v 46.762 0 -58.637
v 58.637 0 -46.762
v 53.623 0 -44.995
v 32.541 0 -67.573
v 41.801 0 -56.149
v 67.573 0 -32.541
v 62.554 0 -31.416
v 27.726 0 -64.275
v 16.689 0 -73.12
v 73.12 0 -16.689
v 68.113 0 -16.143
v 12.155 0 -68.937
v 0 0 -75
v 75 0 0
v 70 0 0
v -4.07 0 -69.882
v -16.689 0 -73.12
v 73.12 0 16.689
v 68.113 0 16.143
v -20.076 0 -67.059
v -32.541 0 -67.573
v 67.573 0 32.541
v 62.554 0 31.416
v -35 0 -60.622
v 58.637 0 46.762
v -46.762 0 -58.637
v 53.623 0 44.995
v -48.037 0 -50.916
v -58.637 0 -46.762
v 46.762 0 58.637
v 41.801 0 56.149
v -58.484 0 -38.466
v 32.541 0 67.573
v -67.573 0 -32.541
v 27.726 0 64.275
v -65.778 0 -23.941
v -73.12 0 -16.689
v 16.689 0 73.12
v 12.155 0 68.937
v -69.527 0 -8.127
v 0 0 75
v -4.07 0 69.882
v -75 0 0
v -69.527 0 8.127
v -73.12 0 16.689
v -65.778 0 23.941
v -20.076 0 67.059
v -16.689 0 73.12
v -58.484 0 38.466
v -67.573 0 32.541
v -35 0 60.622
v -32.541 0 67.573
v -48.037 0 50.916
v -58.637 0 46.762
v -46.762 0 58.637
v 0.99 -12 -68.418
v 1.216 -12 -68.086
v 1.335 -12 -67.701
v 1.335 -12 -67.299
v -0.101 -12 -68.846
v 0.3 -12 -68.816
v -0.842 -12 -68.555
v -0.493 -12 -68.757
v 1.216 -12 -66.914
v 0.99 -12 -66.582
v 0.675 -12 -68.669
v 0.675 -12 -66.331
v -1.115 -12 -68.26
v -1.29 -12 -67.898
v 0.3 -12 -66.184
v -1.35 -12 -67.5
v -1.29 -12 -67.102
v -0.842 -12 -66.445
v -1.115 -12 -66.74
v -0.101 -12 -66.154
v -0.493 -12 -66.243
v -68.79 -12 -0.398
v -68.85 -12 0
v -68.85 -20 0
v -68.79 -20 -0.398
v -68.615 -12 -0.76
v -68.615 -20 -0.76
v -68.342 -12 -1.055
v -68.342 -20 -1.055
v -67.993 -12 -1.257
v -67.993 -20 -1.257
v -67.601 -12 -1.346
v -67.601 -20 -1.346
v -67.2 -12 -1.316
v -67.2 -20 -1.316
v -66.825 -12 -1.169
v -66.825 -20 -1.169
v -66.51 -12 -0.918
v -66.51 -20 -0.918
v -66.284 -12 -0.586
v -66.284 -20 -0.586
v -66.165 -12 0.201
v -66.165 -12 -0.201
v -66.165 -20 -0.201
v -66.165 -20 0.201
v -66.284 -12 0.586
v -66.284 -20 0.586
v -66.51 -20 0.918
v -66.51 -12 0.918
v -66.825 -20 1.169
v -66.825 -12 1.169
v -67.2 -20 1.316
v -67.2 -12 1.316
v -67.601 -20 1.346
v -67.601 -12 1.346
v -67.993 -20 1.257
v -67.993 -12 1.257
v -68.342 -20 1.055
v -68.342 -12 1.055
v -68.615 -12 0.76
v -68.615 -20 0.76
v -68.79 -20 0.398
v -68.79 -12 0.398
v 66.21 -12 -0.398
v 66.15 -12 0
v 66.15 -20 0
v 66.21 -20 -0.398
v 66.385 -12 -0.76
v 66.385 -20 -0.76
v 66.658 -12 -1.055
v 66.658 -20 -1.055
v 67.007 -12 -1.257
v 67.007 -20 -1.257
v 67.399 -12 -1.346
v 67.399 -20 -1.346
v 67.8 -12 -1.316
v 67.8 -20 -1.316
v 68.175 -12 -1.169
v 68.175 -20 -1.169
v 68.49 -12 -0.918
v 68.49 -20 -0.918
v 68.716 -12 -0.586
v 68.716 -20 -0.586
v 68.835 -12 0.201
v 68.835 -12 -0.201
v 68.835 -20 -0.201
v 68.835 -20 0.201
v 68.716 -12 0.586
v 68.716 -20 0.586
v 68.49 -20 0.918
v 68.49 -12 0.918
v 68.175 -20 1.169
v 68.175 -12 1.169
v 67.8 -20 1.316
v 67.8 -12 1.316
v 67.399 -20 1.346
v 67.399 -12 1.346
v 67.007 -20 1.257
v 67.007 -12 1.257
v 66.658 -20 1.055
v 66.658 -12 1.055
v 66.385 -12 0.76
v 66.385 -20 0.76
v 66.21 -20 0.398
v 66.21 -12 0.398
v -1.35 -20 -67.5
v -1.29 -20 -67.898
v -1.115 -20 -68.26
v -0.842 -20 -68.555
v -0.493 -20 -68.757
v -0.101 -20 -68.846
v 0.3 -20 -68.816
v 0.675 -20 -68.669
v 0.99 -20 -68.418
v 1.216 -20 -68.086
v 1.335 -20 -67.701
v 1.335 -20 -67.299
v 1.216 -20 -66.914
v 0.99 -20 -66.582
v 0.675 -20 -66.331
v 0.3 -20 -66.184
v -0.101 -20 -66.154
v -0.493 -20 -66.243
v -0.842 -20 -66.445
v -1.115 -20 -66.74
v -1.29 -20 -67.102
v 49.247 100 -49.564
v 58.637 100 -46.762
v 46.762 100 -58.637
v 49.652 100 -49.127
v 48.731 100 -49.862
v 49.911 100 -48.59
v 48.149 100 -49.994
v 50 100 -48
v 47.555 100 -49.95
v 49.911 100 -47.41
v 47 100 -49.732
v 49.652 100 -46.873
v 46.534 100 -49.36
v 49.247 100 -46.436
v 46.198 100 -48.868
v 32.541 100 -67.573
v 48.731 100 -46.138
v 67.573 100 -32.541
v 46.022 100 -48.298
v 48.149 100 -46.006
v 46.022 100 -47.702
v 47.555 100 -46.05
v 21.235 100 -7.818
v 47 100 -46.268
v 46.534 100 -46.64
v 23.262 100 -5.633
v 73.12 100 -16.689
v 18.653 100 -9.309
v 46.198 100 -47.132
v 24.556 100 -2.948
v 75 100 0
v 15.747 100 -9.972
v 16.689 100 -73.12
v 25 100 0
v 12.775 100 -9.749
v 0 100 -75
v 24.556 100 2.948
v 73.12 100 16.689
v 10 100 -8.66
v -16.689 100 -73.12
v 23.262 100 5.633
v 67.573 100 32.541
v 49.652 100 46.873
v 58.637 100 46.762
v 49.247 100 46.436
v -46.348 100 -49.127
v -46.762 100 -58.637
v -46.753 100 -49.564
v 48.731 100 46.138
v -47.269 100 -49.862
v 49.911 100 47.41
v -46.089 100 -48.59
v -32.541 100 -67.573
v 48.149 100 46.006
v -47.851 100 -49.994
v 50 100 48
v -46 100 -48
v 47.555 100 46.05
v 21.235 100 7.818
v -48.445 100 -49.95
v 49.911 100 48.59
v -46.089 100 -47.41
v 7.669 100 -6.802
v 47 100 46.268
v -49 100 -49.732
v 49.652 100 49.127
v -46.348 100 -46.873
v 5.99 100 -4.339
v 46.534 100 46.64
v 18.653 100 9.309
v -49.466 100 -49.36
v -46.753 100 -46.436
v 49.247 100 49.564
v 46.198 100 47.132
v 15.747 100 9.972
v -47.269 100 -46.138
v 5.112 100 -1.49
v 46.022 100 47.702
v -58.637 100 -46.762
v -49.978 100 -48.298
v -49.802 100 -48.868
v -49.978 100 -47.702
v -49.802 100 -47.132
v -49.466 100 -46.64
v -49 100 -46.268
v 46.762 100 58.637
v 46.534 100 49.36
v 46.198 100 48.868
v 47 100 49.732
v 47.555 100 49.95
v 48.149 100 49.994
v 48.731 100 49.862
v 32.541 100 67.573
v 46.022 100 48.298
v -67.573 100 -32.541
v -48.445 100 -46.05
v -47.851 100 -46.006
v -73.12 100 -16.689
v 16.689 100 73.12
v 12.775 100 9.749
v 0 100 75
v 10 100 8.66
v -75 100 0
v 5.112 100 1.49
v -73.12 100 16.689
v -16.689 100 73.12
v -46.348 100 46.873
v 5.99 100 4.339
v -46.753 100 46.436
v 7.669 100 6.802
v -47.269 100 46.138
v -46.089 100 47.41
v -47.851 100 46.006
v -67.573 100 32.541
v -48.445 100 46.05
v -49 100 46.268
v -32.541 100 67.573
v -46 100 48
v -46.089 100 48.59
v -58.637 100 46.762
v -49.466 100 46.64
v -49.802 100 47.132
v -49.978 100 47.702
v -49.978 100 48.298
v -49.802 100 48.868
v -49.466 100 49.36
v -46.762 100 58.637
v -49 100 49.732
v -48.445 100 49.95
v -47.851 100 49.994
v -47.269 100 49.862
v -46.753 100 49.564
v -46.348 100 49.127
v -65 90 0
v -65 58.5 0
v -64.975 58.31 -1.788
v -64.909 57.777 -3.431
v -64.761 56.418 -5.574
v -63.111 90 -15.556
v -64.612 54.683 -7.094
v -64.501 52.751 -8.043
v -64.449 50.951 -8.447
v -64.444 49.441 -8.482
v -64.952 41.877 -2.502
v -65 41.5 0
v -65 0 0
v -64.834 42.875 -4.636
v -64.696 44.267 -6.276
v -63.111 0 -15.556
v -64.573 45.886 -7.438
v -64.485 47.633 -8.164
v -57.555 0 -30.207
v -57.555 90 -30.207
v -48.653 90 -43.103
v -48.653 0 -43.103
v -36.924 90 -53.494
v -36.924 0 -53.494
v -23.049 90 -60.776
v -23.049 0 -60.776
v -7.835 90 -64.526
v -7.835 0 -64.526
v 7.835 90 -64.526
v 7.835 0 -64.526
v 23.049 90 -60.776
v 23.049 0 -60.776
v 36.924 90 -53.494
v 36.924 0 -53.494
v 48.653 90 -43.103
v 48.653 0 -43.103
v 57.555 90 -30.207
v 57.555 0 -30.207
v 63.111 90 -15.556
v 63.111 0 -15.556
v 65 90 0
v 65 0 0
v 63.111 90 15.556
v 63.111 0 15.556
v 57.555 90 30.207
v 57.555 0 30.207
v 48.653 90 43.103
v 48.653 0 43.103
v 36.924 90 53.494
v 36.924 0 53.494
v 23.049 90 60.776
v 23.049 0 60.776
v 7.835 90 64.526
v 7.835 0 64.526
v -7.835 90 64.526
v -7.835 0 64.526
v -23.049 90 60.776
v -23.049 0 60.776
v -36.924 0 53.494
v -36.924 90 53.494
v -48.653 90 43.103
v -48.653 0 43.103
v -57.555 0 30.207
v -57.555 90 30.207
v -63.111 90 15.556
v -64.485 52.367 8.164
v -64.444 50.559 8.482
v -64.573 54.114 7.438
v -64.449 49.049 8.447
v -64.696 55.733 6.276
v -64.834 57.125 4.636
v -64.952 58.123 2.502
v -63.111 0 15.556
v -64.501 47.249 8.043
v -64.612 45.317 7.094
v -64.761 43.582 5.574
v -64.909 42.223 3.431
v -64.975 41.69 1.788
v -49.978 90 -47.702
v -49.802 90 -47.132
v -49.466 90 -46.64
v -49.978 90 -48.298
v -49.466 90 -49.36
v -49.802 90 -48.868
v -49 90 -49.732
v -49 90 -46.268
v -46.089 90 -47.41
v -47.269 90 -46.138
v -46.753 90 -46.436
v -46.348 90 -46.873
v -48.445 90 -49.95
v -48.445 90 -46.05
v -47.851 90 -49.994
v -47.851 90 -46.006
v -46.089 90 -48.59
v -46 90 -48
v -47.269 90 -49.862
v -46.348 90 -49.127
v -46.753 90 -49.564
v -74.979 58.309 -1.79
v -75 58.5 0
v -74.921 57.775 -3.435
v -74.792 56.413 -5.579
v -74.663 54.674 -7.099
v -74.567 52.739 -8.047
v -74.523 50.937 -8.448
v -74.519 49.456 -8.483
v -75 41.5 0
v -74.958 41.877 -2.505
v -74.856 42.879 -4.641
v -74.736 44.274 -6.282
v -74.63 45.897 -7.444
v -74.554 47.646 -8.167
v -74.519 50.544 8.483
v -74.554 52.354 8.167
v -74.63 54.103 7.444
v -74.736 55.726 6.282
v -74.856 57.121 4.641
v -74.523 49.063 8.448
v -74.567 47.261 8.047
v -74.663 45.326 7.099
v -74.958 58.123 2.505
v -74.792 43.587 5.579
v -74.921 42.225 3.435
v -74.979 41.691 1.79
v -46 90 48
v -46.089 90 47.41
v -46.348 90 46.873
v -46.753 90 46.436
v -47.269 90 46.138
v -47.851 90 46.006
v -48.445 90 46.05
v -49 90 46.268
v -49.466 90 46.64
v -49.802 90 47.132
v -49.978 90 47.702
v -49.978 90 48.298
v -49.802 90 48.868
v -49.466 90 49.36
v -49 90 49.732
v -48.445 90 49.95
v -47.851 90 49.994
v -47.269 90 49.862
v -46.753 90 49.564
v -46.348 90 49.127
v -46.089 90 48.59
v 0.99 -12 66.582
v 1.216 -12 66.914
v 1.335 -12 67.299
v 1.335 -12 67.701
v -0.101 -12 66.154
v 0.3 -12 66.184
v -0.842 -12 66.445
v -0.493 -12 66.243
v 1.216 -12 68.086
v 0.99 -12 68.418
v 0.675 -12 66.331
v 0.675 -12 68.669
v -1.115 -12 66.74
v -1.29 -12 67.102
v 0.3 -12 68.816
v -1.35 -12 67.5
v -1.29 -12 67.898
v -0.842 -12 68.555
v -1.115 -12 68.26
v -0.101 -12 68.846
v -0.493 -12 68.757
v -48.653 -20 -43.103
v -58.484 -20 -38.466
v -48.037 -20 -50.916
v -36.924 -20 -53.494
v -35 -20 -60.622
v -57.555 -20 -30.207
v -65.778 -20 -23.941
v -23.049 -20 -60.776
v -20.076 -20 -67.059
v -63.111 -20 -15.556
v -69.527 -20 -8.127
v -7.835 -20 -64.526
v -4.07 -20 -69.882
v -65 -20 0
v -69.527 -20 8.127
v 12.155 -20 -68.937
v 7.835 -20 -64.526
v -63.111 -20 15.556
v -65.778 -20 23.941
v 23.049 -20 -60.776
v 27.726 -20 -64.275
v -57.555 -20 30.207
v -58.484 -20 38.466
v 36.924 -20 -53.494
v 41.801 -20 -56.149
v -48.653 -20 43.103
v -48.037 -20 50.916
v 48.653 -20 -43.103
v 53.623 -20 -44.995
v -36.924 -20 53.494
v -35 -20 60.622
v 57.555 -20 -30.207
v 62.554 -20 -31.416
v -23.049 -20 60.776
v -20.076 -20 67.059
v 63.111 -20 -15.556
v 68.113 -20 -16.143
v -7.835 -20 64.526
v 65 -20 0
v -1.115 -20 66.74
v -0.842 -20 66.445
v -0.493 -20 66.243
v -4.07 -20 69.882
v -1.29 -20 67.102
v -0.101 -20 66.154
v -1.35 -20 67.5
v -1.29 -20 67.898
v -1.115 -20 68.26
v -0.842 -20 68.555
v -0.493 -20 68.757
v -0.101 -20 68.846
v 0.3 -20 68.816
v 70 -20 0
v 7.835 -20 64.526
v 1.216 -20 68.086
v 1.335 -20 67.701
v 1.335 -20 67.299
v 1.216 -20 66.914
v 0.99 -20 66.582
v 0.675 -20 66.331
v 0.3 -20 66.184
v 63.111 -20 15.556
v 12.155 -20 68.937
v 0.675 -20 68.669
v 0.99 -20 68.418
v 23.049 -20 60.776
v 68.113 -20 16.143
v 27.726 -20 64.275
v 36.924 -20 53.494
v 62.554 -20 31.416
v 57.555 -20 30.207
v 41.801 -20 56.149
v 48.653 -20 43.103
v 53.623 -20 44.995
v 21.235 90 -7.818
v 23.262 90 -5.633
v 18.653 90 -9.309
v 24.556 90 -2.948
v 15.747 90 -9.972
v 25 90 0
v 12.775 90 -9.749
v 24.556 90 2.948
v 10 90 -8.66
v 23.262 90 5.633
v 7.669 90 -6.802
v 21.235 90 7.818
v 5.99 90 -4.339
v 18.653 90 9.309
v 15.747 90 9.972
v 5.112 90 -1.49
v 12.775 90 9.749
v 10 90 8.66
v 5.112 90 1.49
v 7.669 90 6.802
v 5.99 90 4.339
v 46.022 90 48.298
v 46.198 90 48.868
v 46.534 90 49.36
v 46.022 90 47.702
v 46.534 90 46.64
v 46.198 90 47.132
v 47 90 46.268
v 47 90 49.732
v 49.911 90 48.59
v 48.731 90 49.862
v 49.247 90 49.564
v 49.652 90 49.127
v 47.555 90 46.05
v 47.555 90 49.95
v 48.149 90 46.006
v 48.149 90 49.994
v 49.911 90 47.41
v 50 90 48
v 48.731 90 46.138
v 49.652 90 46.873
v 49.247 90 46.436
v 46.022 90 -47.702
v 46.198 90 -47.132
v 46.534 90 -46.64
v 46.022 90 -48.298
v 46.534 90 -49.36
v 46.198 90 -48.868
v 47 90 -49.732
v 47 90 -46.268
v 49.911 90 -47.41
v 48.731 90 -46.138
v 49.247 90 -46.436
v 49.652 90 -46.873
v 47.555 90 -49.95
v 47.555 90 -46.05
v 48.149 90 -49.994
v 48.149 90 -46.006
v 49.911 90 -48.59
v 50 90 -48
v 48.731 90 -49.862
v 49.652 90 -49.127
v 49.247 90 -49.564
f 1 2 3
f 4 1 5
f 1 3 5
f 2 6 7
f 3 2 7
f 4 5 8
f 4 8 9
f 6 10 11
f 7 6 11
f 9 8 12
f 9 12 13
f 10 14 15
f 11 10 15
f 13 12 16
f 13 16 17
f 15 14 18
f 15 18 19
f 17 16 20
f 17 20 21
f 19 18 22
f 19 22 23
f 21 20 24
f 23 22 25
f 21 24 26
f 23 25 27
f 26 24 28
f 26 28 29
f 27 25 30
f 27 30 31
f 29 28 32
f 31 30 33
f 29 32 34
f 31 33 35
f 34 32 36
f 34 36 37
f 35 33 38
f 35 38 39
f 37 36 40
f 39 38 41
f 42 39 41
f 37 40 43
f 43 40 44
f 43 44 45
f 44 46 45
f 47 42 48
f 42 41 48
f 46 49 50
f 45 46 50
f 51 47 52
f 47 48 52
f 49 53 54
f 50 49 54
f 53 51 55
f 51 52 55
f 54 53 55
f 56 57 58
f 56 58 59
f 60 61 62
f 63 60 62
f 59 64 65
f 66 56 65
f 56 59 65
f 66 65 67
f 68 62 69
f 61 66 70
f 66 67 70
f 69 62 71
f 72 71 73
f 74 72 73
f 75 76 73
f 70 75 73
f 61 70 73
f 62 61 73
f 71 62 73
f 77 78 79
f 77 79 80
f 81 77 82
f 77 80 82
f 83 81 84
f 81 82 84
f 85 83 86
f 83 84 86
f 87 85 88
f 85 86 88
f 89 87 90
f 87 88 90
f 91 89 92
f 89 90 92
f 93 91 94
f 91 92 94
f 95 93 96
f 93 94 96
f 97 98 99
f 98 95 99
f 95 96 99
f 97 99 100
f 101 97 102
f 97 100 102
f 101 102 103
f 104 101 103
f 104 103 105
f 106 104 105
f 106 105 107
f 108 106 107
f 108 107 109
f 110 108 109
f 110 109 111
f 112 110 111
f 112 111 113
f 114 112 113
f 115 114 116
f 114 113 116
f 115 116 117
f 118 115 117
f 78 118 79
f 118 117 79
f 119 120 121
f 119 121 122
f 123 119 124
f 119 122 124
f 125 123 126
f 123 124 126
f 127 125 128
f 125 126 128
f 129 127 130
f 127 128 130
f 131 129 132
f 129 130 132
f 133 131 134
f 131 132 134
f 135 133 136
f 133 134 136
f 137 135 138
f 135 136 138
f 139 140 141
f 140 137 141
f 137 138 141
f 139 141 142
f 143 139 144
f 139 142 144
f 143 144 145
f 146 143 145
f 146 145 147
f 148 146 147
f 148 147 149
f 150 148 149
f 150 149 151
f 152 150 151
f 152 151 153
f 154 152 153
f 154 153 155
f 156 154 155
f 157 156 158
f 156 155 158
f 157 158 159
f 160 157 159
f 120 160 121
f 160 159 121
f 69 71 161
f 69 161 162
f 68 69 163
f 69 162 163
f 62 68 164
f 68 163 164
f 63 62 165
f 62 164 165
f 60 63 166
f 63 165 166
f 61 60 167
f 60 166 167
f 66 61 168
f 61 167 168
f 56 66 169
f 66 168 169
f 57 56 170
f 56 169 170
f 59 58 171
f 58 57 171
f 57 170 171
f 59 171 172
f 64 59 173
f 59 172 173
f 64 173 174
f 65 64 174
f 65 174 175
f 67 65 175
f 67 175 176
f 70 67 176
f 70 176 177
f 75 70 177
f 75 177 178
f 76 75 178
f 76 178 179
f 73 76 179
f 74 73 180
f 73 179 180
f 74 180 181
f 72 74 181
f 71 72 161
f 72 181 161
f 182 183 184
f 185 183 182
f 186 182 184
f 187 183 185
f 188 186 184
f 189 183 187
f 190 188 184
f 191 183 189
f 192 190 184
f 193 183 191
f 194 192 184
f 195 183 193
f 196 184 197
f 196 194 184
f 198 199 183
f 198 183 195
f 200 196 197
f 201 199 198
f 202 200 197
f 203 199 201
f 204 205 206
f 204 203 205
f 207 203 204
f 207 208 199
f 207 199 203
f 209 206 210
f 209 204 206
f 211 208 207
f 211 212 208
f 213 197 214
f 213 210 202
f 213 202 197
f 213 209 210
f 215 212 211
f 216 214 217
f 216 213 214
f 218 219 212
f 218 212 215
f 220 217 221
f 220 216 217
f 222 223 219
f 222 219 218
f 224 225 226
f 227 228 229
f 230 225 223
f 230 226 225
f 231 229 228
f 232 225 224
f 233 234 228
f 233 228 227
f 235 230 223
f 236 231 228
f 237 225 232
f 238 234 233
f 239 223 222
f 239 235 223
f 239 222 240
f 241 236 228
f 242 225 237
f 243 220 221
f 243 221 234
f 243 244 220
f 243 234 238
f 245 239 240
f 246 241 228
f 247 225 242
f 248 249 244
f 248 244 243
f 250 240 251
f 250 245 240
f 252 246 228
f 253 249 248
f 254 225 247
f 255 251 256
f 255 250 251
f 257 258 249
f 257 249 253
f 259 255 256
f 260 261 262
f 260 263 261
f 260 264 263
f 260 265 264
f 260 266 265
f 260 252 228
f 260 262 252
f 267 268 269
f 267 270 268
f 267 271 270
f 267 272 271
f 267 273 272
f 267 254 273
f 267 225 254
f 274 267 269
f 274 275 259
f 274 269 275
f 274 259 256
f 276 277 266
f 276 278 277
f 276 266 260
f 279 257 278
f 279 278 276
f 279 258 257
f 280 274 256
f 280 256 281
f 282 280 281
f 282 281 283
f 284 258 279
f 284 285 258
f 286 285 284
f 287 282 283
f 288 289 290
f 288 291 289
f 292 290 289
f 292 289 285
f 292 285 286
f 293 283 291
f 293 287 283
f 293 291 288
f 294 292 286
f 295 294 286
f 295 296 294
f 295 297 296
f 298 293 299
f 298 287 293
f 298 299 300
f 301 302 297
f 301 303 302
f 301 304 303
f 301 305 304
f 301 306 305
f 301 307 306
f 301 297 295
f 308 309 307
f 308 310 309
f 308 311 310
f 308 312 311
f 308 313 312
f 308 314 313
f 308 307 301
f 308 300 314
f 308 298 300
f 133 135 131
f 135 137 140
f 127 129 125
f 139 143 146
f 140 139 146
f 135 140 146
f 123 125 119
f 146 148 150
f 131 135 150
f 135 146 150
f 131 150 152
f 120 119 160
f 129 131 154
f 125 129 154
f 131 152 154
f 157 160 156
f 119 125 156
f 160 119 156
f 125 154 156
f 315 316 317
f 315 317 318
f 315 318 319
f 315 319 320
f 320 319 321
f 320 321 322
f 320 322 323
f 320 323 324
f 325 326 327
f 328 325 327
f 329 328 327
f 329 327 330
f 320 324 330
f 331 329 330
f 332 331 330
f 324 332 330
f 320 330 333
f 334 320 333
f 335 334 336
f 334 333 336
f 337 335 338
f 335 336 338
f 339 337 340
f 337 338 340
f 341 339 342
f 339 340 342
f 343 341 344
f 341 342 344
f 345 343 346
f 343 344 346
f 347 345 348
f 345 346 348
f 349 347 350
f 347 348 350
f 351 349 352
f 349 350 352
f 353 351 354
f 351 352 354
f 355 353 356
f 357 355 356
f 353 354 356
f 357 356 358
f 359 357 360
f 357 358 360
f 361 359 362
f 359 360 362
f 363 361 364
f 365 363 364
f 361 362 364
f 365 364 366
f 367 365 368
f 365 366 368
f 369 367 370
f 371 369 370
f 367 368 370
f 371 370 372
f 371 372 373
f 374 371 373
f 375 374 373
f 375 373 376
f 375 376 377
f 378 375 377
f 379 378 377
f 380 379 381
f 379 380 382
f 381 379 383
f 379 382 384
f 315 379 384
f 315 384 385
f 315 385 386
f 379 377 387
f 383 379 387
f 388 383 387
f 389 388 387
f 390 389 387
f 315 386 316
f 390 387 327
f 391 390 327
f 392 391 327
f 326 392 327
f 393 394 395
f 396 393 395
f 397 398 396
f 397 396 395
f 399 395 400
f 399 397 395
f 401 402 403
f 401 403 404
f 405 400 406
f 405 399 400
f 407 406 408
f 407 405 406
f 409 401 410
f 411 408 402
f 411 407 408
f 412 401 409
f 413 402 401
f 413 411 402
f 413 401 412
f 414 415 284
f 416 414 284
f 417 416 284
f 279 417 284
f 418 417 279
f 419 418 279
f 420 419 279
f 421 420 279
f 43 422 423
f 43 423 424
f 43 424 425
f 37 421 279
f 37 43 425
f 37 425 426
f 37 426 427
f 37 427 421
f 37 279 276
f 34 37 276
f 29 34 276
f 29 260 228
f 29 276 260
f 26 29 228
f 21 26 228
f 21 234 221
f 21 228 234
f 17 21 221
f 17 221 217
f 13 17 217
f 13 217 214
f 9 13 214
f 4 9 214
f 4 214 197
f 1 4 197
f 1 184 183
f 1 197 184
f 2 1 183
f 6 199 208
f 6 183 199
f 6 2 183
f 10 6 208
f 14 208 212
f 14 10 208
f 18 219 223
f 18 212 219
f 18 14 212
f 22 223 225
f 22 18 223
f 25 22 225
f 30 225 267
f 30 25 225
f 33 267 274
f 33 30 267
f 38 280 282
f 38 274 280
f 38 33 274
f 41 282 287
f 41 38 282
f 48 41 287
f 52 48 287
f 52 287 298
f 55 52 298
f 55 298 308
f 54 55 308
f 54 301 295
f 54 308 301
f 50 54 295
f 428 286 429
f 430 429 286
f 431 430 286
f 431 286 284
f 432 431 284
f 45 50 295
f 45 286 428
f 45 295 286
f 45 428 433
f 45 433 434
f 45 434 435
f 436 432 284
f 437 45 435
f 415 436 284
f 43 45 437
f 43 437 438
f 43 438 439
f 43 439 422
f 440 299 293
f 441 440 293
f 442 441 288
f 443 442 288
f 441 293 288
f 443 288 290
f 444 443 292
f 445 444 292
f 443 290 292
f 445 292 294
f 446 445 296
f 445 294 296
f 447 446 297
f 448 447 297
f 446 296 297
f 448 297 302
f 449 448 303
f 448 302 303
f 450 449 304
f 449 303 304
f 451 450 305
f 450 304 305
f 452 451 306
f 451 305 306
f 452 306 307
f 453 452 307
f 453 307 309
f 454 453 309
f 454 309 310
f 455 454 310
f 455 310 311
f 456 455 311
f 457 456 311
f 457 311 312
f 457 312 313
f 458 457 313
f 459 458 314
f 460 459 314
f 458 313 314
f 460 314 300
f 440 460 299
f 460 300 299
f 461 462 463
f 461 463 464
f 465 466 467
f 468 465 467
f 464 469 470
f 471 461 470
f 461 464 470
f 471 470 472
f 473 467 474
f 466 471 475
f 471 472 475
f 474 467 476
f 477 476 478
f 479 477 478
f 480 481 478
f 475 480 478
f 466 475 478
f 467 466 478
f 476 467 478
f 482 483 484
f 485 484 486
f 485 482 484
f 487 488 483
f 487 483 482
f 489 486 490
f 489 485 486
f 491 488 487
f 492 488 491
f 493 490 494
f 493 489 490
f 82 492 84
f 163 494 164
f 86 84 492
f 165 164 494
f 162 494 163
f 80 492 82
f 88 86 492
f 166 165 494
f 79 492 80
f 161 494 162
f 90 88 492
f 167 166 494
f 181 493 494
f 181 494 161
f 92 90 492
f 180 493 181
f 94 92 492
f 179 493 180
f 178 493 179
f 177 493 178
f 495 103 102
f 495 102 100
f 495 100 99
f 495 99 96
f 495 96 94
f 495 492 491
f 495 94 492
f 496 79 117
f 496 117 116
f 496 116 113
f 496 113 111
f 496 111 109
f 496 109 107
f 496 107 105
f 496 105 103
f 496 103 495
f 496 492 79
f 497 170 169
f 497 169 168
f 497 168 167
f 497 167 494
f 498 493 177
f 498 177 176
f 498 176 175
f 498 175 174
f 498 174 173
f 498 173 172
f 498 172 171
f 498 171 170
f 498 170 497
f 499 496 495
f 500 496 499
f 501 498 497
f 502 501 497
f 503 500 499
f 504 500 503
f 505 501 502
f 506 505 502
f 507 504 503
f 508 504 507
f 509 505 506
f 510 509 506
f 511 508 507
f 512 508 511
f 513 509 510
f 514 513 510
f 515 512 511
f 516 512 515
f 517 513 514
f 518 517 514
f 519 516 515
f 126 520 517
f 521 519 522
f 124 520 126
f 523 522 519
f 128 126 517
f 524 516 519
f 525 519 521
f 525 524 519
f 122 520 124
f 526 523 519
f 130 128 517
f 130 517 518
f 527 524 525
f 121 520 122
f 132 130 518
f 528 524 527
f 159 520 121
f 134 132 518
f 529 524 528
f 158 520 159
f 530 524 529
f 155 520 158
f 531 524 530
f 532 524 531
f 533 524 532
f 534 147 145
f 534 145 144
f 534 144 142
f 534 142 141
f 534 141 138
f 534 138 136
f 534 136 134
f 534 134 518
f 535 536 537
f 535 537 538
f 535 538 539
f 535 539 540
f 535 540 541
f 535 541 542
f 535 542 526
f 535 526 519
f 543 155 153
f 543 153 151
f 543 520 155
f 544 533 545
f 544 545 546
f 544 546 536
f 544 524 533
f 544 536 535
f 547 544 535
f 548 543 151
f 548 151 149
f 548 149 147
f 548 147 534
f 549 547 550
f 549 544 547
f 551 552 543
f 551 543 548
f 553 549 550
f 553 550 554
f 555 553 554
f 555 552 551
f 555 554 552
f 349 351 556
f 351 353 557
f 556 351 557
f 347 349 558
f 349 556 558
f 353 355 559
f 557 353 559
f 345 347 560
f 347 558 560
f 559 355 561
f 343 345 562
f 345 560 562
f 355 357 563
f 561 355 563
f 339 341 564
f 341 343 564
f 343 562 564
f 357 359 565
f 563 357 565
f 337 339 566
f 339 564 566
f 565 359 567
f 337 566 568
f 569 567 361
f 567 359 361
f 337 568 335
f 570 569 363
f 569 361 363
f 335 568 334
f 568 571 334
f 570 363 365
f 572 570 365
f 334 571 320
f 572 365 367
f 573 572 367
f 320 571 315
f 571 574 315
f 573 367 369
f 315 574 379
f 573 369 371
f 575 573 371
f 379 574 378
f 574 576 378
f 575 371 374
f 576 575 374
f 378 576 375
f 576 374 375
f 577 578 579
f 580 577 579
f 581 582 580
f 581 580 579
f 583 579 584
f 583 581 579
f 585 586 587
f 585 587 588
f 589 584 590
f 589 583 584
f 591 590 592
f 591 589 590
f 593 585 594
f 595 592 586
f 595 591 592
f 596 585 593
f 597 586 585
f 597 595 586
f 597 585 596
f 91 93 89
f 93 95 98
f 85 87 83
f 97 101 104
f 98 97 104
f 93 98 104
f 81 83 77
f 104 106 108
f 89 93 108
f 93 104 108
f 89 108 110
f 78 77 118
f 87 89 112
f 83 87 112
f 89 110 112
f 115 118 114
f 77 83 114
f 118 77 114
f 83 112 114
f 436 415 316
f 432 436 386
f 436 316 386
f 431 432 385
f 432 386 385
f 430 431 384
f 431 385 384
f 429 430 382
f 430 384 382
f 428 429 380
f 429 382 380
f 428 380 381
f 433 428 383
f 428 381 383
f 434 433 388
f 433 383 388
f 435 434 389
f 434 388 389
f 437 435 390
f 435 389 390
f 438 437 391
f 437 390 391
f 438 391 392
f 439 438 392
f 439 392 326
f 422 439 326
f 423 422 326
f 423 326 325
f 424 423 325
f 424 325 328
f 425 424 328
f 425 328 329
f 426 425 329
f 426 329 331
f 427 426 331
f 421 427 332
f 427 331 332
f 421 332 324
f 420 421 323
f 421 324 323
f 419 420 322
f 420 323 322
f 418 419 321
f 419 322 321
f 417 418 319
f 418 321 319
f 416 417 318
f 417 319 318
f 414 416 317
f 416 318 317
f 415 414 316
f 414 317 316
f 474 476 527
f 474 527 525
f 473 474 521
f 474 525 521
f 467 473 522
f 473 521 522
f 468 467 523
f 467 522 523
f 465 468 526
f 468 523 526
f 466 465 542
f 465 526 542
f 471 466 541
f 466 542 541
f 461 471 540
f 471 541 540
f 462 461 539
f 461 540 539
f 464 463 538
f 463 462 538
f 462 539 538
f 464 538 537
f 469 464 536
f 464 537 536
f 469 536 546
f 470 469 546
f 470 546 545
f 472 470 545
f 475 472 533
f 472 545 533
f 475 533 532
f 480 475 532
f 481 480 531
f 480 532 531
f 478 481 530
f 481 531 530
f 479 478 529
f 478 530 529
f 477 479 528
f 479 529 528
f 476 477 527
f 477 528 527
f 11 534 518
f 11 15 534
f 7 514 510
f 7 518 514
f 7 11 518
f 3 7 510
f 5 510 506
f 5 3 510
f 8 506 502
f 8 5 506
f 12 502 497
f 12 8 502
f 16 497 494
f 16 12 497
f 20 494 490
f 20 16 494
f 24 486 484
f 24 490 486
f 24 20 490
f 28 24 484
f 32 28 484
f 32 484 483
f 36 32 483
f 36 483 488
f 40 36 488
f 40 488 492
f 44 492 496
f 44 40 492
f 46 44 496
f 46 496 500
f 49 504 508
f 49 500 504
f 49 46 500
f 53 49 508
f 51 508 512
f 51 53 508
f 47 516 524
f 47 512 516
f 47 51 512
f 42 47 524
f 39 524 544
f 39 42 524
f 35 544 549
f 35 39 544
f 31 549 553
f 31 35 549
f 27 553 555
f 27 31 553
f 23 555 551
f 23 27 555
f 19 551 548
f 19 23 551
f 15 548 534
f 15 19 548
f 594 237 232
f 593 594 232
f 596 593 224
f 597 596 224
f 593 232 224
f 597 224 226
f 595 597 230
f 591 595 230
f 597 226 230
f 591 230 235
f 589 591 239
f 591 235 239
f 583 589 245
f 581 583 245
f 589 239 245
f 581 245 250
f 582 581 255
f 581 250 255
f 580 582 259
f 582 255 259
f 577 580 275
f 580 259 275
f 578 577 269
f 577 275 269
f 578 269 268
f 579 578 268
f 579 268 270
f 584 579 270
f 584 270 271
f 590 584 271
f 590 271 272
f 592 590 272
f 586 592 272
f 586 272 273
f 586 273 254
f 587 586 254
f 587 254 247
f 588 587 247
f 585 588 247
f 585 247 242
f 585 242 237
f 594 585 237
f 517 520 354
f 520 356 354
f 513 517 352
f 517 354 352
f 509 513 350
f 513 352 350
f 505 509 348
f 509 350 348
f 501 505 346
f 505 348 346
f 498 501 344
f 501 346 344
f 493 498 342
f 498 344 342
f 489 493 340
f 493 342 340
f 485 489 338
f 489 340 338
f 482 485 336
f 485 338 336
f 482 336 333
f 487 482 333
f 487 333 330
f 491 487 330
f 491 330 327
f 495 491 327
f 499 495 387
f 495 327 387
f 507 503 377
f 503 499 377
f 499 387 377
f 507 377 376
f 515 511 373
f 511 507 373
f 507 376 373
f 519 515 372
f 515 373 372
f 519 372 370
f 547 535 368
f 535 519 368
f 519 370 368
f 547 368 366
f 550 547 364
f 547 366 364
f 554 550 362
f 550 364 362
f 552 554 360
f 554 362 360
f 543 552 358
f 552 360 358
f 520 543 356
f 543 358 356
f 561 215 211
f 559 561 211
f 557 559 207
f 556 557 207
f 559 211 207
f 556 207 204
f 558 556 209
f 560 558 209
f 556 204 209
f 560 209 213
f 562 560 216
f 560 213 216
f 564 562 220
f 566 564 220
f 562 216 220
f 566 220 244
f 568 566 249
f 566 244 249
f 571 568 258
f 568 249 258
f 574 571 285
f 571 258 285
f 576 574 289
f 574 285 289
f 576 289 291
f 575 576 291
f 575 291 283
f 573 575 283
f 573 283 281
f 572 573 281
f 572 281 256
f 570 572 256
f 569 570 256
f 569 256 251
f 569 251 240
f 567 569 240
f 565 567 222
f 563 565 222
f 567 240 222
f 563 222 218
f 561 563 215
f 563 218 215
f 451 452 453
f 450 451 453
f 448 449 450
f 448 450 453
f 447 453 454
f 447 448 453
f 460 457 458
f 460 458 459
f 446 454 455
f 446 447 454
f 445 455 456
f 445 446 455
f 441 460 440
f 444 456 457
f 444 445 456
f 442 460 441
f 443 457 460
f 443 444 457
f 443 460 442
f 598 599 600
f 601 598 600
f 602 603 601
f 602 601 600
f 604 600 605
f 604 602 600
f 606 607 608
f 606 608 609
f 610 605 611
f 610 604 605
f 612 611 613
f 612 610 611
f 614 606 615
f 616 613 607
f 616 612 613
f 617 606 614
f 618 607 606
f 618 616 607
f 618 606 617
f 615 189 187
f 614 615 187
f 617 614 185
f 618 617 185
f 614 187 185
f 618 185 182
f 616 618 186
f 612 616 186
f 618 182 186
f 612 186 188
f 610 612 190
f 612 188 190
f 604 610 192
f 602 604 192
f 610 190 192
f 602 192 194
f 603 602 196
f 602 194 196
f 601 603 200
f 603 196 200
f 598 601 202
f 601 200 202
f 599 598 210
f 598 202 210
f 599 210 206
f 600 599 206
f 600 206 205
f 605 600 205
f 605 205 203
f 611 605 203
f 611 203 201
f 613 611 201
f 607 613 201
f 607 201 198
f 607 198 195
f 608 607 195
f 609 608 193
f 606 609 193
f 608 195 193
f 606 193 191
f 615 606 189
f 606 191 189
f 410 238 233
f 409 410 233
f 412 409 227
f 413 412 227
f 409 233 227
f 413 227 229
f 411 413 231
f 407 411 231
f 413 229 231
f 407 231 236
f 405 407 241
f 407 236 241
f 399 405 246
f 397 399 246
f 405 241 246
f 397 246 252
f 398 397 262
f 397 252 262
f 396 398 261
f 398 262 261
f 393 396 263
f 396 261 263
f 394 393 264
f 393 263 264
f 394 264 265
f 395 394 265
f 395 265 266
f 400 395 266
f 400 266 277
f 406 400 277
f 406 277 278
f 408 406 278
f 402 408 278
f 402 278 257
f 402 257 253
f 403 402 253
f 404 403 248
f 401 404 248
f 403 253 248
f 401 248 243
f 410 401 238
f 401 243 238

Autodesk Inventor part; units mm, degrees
ref_plane "YZ Plane" through (0, 0, 0) normal (1, 0, 0) x (0, 1, 0)
ref_plane "XY Plane" through (0, 0, 0) normal (0, 0, 1) x (1, 0, 0)
sketch "스케치2" plane through (0, 0, 0) normal (0, 1, 0) x (-1, 0, 0)
  circle A0 centre (0, 0) radius 75
  dimension "d1" = 150
extrude "돌출1" add sketch "스케치2" along normal blind 100
shell "쉘1" thickness 10 removed faces 1 at (-17.7208, 0, 28.0232)
sketch "스케치4" plane through (0, 0, 0) normal (0, -1, 0) x (1, 0, 0)
  circle A0 centre (0, 0) radius 65
  circle A1 centre (0, 0) radius 70
  dimension "d10" = 140
extrude "돌출3" add sketch "스케치4" along normal blind 20
ref_plane "작업 평면1" through (0, -20, 0) normal (0, 1, 0) x (-1, 0, 0)
sketch "스케치5" plane through (0, -20, 0) normal (0, 1, 0) x (-1, 0, 0)
  circle A0 centre (-67.5, 0) radius 1.35
  circle A1 centre (0, -67.5) radius 1.35
  circle A2 centre (67.5, 0) radius 1.35
  circle A3 centre (0, 67.5) radius 1.35
  point P0 (0, 0)
  point P1 (0, -67.5)
  point P2 (0, 0)
  point P3 (67.5, 0)
  point P4 (0, 0)
  point P5 (0, 67.5)
  point P6 (0, 0)
  point P7 (0, 0)
  dimension "d17" = 360
  dimension "d71" = 360
sketch "스케치7" plane through (0, 100, 0) normal (0, 1, 0) x (1, 0, 0)
  circle A0 centre (15, 0) radius 10
  point P0 (0, 0)
  dimension "d45" = 20
  dimension "d46" = 15
extrude "돌출4" cut sketch "스케치7" against normal blind 10
sketch "스케치8" plane through (0, 0, 0) normal (1, 0, 0) x (0, 1, 0)
  circle A0 centre (50, 0) radius 8.5
  line L0 (0, 75) -> (0, -75) projected
  point P0 (0, 0)
  dimension "d30" = 17
  dimension "d31" = 50
extrude "돌출5" cut sketch "스케치8" against normal through all
sketch "스케치12" plane through (0, 100, 0) normal (0, 1, 0) x (1, 0, 0)
  circle A0 centre (15, 0) radius 10 projected
  circle A1 centre (48, -48) radius 2
  circle A2 centre (-48, -48) radius 2
  circle A3 centre (48, 48) radius 2
  circle A4 centre (-48, 48) radius 2
  line L0 (48, 48) -> (-48, -48) construction
  line L1 (-48, 48) -> (48, -48) construction
  point P0 (0, 0)
  dimension "d66" = 4
  dimension "d75" = 96
  dimension "d76" = 96
extrude "돌출8" cut sketch "스케치12" against normal blind 10 contours A1 | A2 | A3 | A4
extrude "돌출9" cut sketch "스케치5" along normal blind 8
properties part number "바텀(상)"
